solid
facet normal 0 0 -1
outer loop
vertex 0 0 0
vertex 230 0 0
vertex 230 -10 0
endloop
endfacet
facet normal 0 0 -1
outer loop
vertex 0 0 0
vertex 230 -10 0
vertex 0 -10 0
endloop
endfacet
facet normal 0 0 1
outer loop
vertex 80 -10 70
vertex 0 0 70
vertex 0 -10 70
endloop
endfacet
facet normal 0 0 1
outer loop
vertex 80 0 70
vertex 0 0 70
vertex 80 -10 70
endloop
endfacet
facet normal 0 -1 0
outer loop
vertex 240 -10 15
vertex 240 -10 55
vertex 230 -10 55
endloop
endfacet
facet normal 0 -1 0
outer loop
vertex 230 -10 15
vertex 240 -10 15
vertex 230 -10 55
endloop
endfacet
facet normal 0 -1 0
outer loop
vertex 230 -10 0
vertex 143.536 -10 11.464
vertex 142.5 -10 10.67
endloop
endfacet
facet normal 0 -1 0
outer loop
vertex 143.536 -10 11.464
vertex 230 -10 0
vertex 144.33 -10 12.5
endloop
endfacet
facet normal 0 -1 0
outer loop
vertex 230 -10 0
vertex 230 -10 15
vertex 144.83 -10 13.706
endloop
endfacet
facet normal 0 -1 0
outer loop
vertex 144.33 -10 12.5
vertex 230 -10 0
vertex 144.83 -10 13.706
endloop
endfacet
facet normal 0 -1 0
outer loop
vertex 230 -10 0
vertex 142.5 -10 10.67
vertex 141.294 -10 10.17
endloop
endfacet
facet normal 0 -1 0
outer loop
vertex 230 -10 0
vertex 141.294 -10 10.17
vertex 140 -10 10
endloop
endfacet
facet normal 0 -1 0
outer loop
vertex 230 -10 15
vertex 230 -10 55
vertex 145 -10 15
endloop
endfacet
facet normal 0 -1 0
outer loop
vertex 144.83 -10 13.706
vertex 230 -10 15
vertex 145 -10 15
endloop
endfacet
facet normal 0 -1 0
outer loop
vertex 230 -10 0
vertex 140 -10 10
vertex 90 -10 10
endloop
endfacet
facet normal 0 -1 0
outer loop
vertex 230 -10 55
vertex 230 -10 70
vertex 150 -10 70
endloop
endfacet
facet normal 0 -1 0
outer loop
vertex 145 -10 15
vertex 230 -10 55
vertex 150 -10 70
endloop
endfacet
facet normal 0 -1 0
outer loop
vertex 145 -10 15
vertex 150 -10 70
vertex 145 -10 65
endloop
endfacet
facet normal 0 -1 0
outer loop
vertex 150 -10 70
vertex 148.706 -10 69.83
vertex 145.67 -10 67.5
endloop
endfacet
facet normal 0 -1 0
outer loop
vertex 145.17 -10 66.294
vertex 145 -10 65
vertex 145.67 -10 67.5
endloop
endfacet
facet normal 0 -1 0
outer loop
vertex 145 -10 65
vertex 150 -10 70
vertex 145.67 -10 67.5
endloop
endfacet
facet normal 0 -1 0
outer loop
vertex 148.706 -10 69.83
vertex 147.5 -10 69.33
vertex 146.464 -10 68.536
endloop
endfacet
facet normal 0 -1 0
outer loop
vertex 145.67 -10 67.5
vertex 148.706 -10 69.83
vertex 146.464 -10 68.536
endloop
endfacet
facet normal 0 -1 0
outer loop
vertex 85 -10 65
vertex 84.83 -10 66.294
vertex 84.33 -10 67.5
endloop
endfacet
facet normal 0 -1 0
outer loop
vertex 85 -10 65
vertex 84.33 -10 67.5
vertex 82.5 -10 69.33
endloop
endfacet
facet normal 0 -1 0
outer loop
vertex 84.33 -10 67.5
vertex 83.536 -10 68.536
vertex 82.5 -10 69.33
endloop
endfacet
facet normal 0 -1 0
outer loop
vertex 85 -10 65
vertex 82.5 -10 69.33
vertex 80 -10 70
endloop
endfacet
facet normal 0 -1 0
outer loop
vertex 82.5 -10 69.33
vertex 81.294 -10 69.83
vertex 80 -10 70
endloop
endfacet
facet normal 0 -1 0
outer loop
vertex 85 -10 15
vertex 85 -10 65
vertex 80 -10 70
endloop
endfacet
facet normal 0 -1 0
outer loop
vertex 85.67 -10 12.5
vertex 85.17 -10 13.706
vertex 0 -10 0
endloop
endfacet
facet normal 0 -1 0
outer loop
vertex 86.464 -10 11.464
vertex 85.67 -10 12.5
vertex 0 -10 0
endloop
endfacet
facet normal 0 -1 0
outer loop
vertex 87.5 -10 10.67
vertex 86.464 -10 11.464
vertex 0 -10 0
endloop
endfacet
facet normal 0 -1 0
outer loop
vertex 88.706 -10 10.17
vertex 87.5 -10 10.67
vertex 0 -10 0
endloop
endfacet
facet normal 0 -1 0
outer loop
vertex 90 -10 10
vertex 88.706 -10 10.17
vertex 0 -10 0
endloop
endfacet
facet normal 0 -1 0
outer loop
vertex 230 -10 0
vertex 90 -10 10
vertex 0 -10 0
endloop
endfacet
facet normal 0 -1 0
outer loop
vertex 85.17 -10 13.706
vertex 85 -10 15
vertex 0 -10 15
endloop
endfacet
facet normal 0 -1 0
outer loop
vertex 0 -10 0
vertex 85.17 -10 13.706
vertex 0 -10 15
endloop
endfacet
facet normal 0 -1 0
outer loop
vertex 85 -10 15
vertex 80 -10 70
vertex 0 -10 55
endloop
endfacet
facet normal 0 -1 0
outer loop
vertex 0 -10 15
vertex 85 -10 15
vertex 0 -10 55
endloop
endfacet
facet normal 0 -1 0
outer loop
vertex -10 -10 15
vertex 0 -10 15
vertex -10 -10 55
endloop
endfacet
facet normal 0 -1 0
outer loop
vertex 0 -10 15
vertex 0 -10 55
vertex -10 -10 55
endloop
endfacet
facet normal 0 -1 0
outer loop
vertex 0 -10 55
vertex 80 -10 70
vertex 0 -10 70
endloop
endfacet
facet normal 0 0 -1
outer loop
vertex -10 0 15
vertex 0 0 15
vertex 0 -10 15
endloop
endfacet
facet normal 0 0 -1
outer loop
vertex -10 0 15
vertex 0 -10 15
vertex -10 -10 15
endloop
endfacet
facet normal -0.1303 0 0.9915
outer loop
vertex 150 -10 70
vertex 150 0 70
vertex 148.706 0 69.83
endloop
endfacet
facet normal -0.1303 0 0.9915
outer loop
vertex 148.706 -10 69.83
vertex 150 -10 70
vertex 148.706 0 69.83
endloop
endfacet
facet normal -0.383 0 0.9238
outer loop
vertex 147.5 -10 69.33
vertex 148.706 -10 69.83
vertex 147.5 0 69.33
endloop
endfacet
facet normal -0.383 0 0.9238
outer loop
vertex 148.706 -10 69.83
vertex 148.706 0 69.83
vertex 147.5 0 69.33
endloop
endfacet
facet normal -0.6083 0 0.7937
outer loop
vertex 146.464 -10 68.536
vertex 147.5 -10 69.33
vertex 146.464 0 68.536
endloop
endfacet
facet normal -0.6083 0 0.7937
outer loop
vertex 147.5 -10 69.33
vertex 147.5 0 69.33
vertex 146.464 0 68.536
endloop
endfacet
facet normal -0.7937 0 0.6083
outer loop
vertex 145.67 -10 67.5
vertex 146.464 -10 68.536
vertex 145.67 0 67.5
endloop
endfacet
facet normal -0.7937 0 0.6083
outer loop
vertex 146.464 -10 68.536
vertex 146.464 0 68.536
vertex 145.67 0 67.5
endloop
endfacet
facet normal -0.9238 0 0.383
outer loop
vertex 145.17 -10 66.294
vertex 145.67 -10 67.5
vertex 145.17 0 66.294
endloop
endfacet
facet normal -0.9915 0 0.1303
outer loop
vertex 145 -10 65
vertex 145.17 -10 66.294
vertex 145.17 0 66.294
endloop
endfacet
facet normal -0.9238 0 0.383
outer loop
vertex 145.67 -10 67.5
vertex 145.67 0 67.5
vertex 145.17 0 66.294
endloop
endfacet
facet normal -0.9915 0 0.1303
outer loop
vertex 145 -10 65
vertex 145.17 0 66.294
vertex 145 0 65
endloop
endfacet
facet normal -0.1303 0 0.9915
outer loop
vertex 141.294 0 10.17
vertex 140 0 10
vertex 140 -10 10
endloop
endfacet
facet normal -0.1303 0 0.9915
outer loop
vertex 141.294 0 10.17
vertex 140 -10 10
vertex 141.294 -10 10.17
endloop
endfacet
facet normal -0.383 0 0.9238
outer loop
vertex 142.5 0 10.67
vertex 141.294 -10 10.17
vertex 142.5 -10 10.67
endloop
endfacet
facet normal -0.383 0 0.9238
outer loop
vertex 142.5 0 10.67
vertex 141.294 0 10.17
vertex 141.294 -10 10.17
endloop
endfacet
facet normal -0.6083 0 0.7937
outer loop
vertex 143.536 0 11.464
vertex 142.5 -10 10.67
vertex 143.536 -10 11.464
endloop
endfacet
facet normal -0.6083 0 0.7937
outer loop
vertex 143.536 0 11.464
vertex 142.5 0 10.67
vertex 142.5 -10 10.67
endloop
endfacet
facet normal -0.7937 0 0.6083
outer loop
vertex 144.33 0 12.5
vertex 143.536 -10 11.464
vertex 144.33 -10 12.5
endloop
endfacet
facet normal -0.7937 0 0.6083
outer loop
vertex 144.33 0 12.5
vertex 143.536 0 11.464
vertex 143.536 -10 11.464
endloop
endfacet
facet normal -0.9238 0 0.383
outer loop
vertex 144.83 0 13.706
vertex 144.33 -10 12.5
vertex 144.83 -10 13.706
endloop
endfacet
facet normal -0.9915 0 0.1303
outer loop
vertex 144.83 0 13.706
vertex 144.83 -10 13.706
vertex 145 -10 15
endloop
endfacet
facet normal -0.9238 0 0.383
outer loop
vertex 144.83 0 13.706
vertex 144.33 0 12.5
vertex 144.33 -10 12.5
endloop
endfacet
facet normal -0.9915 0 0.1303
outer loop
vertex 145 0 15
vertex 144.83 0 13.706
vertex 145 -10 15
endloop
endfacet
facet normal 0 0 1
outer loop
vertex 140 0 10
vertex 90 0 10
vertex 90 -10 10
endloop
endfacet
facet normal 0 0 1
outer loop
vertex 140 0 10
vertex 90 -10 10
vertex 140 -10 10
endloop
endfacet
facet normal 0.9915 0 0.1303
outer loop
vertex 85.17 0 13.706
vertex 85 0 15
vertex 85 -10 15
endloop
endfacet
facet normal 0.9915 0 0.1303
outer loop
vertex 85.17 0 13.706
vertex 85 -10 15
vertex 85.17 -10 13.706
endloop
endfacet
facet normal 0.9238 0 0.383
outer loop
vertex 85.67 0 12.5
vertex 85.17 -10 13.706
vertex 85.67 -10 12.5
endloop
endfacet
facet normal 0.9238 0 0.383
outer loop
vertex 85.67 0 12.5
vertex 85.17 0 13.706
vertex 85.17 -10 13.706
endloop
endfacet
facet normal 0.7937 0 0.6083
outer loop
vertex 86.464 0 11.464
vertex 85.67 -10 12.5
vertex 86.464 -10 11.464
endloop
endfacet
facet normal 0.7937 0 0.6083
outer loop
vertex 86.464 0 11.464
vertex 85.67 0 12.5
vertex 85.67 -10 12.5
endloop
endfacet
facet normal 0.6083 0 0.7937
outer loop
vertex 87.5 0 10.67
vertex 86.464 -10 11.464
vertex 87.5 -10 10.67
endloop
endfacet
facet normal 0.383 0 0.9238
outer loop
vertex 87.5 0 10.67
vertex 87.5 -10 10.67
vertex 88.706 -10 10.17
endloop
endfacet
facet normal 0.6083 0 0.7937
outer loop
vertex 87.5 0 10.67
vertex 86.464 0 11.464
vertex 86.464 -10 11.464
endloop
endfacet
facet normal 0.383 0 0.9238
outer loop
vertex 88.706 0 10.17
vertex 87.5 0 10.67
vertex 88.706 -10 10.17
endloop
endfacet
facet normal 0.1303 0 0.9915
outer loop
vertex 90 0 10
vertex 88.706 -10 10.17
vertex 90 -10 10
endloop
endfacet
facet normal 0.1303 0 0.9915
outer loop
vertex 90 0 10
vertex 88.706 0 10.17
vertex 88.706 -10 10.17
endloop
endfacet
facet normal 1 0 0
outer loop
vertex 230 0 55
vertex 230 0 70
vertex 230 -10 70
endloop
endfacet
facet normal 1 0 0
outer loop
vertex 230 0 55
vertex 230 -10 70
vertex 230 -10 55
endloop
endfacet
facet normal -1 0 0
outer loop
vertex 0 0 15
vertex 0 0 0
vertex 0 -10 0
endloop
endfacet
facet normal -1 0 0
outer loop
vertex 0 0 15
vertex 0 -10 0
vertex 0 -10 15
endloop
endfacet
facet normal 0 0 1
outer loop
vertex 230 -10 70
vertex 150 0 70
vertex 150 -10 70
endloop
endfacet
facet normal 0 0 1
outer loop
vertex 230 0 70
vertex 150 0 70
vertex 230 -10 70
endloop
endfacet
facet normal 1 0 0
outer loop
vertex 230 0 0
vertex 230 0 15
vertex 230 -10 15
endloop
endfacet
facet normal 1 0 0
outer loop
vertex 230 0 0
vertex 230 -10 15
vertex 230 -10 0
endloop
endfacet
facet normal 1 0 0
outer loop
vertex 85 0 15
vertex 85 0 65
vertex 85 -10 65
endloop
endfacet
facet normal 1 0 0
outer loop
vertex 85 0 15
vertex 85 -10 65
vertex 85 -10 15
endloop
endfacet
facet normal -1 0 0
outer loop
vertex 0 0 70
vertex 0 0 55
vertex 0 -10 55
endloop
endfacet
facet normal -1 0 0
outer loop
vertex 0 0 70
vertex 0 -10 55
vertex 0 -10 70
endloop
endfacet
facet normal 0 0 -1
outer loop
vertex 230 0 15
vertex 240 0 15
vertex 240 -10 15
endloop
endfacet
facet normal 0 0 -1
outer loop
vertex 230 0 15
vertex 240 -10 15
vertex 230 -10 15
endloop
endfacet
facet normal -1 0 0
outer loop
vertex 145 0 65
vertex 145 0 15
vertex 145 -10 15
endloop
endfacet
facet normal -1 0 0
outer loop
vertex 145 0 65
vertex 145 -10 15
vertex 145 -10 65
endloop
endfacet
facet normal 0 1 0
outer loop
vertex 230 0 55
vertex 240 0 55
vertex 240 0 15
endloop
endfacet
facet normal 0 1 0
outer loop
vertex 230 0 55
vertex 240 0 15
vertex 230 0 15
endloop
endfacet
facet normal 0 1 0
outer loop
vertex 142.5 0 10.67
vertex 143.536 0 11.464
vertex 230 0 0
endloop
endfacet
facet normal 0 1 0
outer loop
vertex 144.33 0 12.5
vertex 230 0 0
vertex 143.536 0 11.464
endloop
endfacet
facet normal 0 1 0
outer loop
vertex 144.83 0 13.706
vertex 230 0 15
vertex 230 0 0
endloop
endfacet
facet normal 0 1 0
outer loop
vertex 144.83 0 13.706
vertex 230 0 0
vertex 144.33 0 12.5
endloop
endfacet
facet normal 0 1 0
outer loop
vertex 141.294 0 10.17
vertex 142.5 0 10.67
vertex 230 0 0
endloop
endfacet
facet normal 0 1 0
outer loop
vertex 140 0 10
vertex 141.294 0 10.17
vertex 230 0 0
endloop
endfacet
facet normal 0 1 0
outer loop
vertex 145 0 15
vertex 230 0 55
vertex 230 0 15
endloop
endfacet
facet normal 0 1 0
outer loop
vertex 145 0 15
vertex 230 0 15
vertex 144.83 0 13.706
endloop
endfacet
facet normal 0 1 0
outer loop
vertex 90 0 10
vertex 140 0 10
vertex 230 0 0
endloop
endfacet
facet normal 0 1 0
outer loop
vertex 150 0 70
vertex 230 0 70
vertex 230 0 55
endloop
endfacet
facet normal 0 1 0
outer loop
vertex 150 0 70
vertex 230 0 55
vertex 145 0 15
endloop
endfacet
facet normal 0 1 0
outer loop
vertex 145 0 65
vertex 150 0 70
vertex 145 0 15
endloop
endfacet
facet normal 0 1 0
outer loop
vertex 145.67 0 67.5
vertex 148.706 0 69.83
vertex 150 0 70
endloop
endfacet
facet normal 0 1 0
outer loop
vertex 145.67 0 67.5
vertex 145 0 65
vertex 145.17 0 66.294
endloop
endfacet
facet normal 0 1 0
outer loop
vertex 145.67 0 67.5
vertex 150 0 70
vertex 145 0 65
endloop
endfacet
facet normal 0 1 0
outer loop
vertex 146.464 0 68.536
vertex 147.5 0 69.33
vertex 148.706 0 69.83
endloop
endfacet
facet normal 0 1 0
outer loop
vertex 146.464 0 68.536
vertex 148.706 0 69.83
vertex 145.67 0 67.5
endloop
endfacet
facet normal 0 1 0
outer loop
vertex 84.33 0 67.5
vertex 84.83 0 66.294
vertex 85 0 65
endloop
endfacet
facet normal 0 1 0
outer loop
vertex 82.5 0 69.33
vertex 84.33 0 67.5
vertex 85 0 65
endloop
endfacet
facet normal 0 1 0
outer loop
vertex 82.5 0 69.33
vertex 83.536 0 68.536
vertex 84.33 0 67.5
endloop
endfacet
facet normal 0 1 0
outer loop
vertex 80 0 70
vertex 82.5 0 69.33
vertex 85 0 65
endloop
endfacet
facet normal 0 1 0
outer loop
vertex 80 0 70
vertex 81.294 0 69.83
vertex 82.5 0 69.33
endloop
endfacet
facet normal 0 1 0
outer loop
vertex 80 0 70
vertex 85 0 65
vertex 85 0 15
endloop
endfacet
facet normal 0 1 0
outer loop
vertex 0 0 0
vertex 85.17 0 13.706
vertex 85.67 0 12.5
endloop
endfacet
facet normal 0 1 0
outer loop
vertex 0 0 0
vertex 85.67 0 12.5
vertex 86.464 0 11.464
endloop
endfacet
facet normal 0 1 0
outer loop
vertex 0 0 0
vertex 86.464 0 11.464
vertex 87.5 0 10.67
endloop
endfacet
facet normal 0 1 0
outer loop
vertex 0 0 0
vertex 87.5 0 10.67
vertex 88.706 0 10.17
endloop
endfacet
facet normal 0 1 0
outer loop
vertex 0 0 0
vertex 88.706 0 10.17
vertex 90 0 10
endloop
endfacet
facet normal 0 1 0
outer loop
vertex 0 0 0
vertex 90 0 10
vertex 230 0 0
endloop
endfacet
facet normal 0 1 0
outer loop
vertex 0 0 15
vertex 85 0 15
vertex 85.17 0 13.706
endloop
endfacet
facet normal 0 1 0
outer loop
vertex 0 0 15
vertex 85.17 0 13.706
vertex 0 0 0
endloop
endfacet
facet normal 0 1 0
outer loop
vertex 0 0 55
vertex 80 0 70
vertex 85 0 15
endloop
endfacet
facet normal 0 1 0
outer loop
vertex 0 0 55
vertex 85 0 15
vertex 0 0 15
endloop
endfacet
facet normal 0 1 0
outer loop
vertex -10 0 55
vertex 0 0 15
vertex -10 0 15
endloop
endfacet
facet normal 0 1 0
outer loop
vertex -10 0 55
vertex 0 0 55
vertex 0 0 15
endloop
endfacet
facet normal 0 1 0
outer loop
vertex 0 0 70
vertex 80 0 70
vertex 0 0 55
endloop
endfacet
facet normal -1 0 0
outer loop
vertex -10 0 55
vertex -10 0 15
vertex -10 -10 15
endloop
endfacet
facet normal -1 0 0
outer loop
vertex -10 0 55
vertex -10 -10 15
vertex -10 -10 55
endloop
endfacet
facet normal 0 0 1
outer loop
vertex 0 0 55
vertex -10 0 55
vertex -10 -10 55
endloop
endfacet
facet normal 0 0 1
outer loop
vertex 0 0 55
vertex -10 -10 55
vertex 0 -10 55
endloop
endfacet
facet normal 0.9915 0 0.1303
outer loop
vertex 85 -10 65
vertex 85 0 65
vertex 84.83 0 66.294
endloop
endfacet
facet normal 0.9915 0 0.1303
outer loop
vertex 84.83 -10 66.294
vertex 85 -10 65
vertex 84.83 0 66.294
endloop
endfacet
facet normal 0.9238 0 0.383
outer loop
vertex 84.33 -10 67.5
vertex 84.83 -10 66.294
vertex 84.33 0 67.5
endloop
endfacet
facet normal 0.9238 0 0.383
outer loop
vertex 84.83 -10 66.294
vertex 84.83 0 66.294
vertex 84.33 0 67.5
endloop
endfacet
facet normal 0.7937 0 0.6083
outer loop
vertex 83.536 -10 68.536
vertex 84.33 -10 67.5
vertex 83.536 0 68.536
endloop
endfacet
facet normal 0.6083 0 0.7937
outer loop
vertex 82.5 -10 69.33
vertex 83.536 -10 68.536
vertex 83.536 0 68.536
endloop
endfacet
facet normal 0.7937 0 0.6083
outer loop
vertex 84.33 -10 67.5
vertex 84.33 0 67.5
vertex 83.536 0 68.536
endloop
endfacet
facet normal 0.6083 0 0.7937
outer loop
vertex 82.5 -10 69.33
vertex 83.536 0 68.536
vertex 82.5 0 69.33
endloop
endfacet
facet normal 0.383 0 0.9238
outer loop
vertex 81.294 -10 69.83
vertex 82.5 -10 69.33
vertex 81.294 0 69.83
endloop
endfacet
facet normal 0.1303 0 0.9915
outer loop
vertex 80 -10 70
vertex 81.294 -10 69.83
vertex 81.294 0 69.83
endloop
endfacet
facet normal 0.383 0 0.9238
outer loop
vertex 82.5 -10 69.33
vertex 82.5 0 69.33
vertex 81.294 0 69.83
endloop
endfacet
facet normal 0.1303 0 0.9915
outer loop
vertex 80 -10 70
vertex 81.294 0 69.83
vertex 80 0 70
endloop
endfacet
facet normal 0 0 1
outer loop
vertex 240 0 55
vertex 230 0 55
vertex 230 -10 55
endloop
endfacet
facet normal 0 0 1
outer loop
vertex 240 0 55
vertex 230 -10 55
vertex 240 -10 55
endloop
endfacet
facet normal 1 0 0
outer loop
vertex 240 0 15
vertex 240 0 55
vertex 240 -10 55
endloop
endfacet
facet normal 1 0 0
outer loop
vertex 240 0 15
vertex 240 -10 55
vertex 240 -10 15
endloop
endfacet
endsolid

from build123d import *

# Parameters (mm, degrees)
PAD_DEPTH = 10


with BuildPart() as part:
    # Sketch → Pad (new body)
    with BuildSketch(Plane.XZ):
        with BuildLine():
            Line((0, 0), (0, 15))
            Line((0, 15), (-10, 15))
            Line((-10, 15), (-10, 55))
            Line((-10, 55), (0, 55))
            Line((0, 55), (0, 70))
            Line((0, 70), (80, 70))
            ThreePointArc((85, 65), (83.535534, 68.535534), (80, 70))
            Line((85, 65), (85, 15))
            ThreePointArc((85, 15), (86.464466, 11.464466), (90, 10))
            Line((90, 10), (140, 10))
            ThreePointArc((140, 10), (143.535534, 11.464466), (145, 15))
            Line((145, 15), (145, 65))
            ThreePointArc((150, 70), (146.464466, 68.535534), (145, 65))
            Line((150, 70), (230, 70))
            Line((230, 70), (230, 55))
            Line((230, 55), (240, 55))
            Line((240, 55), (240, 15))
            Line((240, 15), (230, 15))
            Line((230, 15), (230, 0))
            Line((230, 0), (0, 0))
        make_face()
    extrude(amount=PAD_DEPTH)


solid = part.part
